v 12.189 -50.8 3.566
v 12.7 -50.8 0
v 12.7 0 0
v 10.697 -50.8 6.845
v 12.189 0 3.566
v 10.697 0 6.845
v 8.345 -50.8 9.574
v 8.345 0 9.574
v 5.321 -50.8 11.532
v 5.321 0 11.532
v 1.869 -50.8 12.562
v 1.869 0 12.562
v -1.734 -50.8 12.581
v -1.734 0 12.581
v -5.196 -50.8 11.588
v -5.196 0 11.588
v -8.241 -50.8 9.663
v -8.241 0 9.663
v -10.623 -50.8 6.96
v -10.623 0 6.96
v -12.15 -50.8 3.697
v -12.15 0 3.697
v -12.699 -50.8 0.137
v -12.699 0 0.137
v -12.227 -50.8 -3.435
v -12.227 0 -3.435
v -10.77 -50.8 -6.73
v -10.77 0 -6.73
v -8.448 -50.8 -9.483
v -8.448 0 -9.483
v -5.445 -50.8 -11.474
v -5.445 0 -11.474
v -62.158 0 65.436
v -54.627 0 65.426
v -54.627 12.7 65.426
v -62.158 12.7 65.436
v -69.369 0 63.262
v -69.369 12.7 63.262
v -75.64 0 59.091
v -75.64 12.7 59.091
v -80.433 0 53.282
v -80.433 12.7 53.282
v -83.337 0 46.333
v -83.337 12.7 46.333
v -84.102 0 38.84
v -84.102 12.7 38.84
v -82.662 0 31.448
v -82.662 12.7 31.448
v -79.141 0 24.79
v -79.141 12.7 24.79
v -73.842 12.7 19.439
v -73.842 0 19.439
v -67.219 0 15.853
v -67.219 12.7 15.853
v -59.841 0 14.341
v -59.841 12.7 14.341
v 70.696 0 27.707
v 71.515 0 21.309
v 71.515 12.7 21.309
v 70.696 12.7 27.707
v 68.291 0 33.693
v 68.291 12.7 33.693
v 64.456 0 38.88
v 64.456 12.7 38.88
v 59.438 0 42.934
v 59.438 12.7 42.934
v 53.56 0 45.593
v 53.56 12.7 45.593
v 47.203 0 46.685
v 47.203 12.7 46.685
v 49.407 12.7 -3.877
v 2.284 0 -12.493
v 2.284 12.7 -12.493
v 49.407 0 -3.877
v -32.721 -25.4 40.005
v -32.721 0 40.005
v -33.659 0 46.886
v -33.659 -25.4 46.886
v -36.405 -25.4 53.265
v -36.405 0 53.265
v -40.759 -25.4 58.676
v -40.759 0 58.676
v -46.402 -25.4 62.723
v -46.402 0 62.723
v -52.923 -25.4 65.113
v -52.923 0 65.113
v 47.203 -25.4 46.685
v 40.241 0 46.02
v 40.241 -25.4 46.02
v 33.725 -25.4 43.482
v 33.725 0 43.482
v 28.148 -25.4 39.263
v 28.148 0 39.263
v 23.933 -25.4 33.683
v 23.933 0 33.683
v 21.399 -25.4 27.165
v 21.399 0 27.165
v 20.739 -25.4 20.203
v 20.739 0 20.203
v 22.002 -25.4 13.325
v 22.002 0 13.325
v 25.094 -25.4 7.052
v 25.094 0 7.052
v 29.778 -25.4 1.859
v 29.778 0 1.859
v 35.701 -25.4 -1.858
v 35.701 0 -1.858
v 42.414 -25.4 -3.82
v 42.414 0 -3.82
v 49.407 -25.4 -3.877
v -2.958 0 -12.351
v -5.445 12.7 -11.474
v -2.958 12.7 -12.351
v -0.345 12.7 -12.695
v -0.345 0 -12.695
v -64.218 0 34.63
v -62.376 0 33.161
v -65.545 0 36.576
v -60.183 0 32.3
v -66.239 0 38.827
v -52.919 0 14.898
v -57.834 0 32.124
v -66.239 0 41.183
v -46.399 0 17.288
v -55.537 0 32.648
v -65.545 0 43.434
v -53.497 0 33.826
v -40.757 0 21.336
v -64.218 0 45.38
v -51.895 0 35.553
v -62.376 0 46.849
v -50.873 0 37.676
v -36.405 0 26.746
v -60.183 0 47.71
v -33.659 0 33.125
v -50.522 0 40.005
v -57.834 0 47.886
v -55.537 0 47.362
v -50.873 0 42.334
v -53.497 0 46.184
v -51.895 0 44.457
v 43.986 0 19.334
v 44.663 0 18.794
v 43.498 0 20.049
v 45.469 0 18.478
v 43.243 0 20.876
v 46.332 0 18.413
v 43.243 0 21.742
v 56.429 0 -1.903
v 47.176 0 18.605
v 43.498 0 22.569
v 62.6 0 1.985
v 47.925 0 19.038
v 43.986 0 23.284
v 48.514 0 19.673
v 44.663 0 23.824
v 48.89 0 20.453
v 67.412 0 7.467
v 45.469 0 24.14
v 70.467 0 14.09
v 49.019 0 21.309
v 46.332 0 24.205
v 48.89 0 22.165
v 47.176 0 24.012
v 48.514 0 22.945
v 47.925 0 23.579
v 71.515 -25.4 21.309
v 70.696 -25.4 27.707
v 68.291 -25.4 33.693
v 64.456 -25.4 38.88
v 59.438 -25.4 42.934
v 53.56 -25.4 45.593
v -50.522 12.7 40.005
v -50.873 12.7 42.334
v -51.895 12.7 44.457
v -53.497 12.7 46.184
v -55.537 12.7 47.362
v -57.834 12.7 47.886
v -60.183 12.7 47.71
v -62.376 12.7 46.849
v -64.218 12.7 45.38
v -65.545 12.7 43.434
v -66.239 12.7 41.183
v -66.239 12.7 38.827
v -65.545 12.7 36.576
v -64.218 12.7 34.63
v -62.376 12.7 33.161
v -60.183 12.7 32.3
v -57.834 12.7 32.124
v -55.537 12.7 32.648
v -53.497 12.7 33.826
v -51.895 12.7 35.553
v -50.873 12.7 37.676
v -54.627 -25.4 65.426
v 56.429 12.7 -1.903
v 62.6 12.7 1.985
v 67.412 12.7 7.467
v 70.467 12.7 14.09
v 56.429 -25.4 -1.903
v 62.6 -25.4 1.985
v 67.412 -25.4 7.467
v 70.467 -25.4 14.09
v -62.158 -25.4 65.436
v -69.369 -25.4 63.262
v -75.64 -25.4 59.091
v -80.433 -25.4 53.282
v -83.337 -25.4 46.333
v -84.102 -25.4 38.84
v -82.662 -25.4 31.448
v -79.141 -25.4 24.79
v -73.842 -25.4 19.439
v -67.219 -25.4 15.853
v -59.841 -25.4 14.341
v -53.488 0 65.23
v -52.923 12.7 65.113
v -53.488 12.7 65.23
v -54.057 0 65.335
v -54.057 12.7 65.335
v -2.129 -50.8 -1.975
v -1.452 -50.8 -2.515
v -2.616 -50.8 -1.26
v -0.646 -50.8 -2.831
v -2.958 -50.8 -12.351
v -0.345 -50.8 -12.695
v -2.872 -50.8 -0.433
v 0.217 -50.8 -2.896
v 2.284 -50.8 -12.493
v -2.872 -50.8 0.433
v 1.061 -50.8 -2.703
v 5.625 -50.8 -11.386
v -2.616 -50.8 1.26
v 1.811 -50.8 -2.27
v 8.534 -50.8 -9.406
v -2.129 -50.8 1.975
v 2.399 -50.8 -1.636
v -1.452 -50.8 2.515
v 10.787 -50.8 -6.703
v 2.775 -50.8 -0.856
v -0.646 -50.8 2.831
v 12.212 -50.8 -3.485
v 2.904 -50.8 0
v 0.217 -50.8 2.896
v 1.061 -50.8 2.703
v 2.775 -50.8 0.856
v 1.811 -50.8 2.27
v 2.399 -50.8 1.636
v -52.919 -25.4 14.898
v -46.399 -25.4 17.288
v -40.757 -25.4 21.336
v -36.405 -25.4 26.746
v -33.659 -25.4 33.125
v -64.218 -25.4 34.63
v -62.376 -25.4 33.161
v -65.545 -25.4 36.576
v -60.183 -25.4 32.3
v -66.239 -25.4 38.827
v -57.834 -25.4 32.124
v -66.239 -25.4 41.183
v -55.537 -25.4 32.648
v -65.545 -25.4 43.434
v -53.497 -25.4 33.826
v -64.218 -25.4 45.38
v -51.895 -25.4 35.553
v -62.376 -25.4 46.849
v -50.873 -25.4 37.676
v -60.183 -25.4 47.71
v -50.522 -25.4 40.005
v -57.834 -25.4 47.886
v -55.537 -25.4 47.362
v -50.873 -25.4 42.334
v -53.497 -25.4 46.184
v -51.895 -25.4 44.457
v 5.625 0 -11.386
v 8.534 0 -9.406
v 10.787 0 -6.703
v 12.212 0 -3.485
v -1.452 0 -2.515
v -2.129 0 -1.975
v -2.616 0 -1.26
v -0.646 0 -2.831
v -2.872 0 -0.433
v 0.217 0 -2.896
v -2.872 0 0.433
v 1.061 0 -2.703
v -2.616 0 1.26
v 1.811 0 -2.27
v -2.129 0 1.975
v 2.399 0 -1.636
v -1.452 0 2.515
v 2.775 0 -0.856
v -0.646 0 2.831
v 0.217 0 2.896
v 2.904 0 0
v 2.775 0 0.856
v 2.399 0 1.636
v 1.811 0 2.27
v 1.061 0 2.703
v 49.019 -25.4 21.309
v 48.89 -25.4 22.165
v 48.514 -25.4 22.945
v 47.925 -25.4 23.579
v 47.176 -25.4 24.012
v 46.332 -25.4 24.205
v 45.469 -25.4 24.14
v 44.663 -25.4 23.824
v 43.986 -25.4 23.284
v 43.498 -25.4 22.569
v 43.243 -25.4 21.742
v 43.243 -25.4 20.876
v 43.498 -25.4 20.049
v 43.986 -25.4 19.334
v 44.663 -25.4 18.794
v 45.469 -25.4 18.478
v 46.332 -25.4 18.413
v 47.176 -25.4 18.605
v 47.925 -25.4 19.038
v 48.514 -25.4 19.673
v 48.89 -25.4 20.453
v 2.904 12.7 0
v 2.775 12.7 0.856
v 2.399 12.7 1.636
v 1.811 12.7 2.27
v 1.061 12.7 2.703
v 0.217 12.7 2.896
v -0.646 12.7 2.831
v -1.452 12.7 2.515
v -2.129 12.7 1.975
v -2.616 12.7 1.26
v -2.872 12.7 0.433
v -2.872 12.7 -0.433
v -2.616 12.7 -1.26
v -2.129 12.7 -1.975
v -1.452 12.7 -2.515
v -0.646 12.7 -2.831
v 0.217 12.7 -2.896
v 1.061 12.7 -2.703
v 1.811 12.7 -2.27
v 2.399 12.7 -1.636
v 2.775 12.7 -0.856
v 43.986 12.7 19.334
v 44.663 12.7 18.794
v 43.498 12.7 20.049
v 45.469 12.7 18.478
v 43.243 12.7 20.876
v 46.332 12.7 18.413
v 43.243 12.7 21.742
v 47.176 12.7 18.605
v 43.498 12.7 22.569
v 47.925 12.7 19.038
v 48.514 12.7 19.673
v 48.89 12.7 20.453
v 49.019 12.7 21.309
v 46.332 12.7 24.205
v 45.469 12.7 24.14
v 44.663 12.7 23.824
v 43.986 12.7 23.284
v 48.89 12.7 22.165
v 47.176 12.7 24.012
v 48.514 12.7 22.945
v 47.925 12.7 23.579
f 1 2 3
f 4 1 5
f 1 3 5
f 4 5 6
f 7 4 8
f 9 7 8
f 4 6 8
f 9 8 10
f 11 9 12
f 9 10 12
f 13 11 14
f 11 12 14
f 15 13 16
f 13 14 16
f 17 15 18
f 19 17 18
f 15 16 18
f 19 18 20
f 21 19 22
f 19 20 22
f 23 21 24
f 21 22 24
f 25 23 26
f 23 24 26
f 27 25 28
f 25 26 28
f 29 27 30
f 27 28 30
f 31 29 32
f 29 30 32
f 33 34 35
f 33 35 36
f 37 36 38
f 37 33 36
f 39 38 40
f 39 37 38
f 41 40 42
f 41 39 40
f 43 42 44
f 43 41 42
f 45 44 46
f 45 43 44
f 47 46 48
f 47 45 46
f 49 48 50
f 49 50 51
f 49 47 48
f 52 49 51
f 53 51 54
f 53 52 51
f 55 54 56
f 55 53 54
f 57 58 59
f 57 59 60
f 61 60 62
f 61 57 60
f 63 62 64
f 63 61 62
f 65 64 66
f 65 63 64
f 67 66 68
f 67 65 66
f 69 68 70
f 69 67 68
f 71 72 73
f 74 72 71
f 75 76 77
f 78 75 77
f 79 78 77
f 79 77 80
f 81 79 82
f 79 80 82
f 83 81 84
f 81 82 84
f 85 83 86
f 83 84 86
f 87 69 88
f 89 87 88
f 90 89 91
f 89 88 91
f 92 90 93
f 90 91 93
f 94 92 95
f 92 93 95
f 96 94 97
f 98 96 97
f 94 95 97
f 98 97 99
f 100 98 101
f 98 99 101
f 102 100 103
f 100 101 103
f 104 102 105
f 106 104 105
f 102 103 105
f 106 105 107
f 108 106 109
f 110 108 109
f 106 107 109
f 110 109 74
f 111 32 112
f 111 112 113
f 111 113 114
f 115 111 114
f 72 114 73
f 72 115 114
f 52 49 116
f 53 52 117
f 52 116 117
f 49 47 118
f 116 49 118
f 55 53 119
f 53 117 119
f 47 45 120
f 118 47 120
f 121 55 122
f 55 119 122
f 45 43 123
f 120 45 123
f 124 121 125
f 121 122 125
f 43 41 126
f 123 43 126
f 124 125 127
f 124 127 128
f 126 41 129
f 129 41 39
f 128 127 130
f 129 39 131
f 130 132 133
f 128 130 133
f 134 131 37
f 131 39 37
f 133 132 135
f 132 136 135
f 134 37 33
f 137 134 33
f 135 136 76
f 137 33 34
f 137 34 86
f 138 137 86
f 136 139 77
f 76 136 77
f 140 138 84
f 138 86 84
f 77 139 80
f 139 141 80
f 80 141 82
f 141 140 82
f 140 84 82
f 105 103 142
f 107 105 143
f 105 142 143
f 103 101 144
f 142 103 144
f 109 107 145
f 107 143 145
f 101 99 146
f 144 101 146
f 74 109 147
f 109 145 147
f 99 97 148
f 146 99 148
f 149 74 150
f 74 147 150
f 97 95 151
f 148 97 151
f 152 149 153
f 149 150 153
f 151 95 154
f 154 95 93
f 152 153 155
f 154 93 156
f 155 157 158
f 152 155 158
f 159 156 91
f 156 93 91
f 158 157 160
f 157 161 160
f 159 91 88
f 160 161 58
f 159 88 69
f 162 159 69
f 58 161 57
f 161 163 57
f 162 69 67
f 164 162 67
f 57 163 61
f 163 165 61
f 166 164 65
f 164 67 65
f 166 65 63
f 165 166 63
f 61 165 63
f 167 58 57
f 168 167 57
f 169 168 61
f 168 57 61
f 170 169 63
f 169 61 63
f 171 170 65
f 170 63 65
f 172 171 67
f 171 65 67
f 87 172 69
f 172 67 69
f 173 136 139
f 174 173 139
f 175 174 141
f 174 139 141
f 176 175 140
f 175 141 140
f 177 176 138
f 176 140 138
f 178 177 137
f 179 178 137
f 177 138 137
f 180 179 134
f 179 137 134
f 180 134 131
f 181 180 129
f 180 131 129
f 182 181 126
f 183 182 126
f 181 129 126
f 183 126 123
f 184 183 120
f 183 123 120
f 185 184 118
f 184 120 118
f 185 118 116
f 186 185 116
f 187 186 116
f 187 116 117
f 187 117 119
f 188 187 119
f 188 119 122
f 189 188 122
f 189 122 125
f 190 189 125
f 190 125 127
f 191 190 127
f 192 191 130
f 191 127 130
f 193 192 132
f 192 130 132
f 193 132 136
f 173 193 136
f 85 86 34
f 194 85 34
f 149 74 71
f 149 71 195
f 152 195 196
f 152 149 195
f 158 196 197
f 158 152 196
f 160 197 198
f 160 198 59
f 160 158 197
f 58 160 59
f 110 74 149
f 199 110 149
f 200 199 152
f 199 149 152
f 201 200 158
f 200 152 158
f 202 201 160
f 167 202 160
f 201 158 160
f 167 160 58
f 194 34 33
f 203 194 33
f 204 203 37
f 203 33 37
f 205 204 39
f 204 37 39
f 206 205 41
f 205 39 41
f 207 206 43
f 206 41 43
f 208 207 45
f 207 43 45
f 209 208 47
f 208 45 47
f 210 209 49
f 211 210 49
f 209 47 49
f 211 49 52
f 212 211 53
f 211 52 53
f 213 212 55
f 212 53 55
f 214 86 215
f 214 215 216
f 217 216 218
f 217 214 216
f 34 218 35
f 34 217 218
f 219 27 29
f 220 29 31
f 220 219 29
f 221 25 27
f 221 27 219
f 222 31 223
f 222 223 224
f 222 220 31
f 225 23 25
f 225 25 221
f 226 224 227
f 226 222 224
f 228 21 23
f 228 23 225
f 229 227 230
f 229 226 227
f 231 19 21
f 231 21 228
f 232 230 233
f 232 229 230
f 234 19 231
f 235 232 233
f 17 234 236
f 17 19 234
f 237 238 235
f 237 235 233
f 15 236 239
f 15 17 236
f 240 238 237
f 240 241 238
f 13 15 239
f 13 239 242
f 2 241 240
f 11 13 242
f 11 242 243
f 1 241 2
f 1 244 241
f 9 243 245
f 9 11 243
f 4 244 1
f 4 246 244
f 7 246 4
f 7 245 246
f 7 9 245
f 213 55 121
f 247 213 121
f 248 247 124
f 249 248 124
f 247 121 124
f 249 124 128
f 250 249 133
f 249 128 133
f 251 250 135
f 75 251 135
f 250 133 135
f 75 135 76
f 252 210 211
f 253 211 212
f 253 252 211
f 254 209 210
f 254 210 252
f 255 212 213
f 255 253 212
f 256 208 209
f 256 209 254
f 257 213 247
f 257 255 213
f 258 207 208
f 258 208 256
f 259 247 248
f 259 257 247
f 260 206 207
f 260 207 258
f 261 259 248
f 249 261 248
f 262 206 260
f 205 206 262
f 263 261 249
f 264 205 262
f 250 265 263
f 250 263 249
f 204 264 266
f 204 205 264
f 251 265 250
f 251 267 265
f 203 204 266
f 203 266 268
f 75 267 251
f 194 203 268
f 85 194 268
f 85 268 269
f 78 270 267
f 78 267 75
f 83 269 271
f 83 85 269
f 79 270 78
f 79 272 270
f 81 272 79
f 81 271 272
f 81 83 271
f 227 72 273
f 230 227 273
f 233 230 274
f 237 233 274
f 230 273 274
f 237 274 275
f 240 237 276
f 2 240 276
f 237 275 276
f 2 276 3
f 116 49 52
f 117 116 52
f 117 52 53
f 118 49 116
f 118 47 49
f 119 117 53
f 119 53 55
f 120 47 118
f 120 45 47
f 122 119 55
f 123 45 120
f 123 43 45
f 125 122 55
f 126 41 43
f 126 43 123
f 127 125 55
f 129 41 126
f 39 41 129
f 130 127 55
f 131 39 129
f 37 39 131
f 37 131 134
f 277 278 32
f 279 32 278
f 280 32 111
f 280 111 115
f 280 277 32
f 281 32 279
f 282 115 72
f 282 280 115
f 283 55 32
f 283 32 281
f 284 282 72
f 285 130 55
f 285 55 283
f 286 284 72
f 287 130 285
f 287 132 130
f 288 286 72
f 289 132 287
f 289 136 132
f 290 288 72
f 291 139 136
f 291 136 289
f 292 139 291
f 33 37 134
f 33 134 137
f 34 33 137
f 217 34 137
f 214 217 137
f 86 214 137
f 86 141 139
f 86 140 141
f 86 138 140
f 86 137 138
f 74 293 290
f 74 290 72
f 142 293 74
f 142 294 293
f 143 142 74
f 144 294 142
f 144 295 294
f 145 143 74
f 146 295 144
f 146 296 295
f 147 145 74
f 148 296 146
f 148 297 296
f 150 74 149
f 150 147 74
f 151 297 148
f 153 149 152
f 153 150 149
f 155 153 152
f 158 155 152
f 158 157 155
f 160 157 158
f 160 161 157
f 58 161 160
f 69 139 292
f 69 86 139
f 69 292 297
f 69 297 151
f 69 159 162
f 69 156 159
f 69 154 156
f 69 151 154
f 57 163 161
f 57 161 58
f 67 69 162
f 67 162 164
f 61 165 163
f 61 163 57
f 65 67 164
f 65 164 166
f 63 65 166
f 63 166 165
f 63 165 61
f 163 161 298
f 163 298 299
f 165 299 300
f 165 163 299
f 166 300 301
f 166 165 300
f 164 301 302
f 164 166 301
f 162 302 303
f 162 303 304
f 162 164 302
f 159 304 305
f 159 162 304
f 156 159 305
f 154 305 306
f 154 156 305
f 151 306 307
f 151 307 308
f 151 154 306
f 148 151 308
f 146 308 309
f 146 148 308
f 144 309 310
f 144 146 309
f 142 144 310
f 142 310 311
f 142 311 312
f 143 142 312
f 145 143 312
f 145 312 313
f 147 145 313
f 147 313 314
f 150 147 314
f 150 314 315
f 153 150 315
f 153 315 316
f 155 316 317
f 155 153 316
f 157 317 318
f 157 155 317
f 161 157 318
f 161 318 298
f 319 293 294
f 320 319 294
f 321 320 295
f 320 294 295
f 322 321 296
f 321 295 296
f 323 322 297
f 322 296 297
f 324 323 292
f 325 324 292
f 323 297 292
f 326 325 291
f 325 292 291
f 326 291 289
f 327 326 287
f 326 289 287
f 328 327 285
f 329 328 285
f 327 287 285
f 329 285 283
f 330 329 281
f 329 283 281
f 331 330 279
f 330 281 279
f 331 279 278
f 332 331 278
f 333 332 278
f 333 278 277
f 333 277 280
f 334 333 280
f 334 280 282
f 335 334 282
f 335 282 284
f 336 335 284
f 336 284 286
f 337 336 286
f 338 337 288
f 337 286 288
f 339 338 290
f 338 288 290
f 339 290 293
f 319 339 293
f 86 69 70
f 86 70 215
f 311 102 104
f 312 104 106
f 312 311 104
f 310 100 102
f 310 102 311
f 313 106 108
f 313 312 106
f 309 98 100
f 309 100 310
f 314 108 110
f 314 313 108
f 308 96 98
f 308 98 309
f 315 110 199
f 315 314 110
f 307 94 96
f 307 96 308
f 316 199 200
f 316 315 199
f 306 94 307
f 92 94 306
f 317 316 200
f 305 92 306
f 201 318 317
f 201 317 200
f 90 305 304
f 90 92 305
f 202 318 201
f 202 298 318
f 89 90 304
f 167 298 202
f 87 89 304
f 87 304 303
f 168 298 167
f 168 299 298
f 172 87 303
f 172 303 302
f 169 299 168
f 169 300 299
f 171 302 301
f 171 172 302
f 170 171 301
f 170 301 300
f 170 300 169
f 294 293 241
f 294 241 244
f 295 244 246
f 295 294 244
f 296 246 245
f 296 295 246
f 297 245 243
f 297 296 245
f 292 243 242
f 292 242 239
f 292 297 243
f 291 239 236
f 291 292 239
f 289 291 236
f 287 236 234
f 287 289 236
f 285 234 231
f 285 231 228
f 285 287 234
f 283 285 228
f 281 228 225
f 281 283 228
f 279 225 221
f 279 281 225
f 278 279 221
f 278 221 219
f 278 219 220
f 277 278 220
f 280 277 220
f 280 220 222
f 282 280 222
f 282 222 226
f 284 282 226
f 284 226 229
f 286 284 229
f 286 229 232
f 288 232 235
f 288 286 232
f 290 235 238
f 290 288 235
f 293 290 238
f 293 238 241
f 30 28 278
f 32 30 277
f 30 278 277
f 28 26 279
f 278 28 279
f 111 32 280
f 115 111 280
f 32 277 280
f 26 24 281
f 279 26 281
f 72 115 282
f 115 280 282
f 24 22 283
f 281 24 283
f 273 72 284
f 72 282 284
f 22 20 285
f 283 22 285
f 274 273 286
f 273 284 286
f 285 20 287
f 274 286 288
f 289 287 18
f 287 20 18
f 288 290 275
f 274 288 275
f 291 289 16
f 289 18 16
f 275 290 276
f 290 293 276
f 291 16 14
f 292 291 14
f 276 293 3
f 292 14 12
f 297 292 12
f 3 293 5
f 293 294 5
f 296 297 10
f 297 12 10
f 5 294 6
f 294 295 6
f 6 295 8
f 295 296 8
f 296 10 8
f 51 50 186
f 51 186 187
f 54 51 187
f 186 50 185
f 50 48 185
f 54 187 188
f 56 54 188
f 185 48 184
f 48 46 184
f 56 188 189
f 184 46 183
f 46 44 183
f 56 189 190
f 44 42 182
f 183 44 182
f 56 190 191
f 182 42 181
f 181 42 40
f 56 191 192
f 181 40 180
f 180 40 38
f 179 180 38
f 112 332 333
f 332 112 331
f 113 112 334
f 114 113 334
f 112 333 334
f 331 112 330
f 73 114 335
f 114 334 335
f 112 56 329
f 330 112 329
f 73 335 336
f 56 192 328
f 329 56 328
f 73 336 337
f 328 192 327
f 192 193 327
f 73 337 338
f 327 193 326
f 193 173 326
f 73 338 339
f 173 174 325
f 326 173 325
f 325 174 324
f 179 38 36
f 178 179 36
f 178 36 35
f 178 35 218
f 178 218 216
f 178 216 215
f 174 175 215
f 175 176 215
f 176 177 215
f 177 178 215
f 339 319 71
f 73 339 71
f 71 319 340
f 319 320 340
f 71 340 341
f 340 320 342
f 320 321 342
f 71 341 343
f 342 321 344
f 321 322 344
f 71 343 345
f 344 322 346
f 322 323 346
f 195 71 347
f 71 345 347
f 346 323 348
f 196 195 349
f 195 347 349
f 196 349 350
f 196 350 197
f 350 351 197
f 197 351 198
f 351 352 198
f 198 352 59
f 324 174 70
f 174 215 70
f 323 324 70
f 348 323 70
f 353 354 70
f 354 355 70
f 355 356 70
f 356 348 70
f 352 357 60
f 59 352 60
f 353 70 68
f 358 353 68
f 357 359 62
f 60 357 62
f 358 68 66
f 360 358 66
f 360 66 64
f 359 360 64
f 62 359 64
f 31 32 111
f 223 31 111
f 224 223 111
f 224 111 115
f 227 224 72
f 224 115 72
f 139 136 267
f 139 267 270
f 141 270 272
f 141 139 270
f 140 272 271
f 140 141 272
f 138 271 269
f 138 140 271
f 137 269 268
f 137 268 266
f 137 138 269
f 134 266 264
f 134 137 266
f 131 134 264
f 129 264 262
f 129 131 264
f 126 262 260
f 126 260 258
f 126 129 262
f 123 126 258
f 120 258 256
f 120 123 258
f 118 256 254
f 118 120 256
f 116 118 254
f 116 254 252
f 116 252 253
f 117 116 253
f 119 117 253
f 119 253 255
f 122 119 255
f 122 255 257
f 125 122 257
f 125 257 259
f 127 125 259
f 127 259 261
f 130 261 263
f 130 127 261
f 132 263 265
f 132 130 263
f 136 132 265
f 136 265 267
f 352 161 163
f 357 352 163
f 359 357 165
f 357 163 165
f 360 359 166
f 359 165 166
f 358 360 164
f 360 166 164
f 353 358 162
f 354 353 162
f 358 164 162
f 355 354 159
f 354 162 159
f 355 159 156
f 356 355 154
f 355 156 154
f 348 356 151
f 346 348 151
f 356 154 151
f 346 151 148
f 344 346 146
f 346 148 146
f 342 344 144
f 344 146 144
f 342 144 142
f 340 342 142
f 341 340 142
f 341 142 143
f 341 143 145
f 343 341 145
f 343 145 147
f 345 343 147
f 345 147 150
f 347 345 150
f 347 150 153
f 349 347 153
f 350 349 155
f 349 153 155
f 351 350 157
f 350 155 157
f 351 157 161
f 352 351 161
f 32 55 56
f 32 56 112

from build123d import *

# Parameters (mm, degrees)
F0_R     = 2.904063
F1_DEPTH = 50.8
F2_DEPTH = 25.4
F0_R_2   = 7.902878
F3_DEPTH = 25.4
F4_DEPTH = 12.7


with BuildPart() as f1:
    # F0 (on Front) → F1 (new body)
    with BuildSketch(Plane.XZ):
        with BuildLine():
            ThreePointArc((2.284209, -12.492894), (9.754472, -8.132667), (12.7, 0))
            ThreePointArc((12.7, 0), (-6.787481, 10.734062), (-5.444897, -11.473583))
            ThreePointArc((-5.444897, -11.473583), (-1.660493, -12.590979), (2.284209, -12.492894))
        make_face()
        Circle(F0_R, mode=Mode.SUBTRACT)
    extrude(amount=F1_DEPTH)


with BuildPart() as f2:
    # F0 (on Front) → F2 (new body)
    with BuildSketch(Plane.XZ):
        with BuildLine():
            ThreePointArc((47.202785, 46.685481), (20.738901, 20.202702), (49.406712, -3.876984))
            ThreePointArc((49.406712, -3.876984), (65.203735, 4.552516), (71.514806, 21.308793))
            ThreePointArc((71.514806, 21.308793), (64.455944, 38.880437), (47.202785, 46.685481))
        make_face()
        with Locations((46.114806, 21.308793)):
            Circle(F0_R, mode=Mode.SUBTRACT)
    extrude(amount=F2_DEPTH)


with BuildPart() as f3:
    # F0 (on Front) → F3 (new body)
    with BuildSketch(Plane.XZ):
        with BuildLine():
            ThreePointArc((-54.626815, 65.42638), (-83.995208, 42.614884), (-59.840918, 14.340564))
            ThreePointArc((-59.840918, 14.340564), (-40.757303, 21.335846), (-32.721072, 40.005001))
            ThreePointArc((-32.721072, 40.005001), (-38.398541, 56.117974), (-52.922834, 65.112777))
            Line((-52.922834, 65.112777), (-54.626815, 65.42638))
        make_face()
        with Locations((-58.424562, 40.005001)):
            Circle(F0_R_2, mode=Mode.SUBTRACT)
    extrude(amount=F3_DEPTH)


with BuildPart() as f4:
    # F0 (on Front) → F4 (new body)
    with BuildSketch(Plane.XZ):
        with BuildLine():
            ThreePointArc((2.284209, -12.492894), (9.754472, -8.132667), (12.7, 0))
            ThreePointArc((12.7, 0), (-6.787481, 10.734062), (-5.444897, -11.473583))
            ThreePointArc((-5.444897, -11.473583), (-1.660493, -12.590979), (2.284209, -12.492894))
        make_face()
        Circle(F0_R, mode=Mode.SUBTRACT)
        with BuildLine():
            ThreePointArc((-5.444897, -11.473583), (-6.787481, 10.734062), (12.7, 0))
            ThreePointArc((12.7, 0), (9.754472, -8.132667), (2.284209, -12.492894))
            Line((2.284209, -12.492894), (49.406712, -3.876984))
            ThreePointArc((49.406712, -3.876984), (20.738901, 20.202702), (47.202785, 46.685481))
            Line((47.202785, 46.685481), (-52.922834, 65.112777))
            ThreePointArc((-52.922834, 65.112777), (-38.398541, 56.117974), (-32.721072, 40.005001))
            ThreePointArc((-32.721072, 40.005001), (-40.757303, 21.335846), (-59.840918, 14.340564))
            Line((-59.840918, 14.340564), (-5.444897, -11.473583))
        make_face()
        with BuildLine():
            ThreePointArc((-54.626815, 65.42638), (-83.995208, 42.614884), (-59.840918, 14.340564))
            ThreePointArc((-59.840918, 14.340564), (-40.757303, 21.335846), (-32.721072, 40.005001))
            ThreePointArc((-32.721072, 40.005001), (-38.398541, 56.117974), (-52.922834, 65.112777))
            Line((-52.922834, 65.112777), (-54.626815, 65.42638))
        make_face()
        with Locations((-58.424562, 40.005001)):
            Circle(F0_R_2, mode=Mode.SUBTRACT)
        with BuildLine():
            ThreePointArc((47.202785, 46.685481), (20.738901, 20.202702), (49.406712, -3.876984))
            ThreePointArc((49.406712, -3.876984), (65.203735, 4.552516), (71.514806, 21.308793))
            ThreePointArc((71.514806, 21.308793), (64.455944, 38.880437), (47.202785, 46.685481))
        make_face()
        with Locations((46.114806, 21.308793)):
            Circle(F0_R, mode=Mode.SUBTRACT)
        with BuildLine():
            ThreePointArc((-52.922834, 65.112777), (-53.772181, 65.28394), (-54.626815, 65.42638))
            Line((-54.626815, 65.42638), (-52.922834, 65.112777))
        make_face()
    extrude(amount=-F4_DEPTH)


solid = Compound([f1.part, f2.part, f3.part, f4.part])
